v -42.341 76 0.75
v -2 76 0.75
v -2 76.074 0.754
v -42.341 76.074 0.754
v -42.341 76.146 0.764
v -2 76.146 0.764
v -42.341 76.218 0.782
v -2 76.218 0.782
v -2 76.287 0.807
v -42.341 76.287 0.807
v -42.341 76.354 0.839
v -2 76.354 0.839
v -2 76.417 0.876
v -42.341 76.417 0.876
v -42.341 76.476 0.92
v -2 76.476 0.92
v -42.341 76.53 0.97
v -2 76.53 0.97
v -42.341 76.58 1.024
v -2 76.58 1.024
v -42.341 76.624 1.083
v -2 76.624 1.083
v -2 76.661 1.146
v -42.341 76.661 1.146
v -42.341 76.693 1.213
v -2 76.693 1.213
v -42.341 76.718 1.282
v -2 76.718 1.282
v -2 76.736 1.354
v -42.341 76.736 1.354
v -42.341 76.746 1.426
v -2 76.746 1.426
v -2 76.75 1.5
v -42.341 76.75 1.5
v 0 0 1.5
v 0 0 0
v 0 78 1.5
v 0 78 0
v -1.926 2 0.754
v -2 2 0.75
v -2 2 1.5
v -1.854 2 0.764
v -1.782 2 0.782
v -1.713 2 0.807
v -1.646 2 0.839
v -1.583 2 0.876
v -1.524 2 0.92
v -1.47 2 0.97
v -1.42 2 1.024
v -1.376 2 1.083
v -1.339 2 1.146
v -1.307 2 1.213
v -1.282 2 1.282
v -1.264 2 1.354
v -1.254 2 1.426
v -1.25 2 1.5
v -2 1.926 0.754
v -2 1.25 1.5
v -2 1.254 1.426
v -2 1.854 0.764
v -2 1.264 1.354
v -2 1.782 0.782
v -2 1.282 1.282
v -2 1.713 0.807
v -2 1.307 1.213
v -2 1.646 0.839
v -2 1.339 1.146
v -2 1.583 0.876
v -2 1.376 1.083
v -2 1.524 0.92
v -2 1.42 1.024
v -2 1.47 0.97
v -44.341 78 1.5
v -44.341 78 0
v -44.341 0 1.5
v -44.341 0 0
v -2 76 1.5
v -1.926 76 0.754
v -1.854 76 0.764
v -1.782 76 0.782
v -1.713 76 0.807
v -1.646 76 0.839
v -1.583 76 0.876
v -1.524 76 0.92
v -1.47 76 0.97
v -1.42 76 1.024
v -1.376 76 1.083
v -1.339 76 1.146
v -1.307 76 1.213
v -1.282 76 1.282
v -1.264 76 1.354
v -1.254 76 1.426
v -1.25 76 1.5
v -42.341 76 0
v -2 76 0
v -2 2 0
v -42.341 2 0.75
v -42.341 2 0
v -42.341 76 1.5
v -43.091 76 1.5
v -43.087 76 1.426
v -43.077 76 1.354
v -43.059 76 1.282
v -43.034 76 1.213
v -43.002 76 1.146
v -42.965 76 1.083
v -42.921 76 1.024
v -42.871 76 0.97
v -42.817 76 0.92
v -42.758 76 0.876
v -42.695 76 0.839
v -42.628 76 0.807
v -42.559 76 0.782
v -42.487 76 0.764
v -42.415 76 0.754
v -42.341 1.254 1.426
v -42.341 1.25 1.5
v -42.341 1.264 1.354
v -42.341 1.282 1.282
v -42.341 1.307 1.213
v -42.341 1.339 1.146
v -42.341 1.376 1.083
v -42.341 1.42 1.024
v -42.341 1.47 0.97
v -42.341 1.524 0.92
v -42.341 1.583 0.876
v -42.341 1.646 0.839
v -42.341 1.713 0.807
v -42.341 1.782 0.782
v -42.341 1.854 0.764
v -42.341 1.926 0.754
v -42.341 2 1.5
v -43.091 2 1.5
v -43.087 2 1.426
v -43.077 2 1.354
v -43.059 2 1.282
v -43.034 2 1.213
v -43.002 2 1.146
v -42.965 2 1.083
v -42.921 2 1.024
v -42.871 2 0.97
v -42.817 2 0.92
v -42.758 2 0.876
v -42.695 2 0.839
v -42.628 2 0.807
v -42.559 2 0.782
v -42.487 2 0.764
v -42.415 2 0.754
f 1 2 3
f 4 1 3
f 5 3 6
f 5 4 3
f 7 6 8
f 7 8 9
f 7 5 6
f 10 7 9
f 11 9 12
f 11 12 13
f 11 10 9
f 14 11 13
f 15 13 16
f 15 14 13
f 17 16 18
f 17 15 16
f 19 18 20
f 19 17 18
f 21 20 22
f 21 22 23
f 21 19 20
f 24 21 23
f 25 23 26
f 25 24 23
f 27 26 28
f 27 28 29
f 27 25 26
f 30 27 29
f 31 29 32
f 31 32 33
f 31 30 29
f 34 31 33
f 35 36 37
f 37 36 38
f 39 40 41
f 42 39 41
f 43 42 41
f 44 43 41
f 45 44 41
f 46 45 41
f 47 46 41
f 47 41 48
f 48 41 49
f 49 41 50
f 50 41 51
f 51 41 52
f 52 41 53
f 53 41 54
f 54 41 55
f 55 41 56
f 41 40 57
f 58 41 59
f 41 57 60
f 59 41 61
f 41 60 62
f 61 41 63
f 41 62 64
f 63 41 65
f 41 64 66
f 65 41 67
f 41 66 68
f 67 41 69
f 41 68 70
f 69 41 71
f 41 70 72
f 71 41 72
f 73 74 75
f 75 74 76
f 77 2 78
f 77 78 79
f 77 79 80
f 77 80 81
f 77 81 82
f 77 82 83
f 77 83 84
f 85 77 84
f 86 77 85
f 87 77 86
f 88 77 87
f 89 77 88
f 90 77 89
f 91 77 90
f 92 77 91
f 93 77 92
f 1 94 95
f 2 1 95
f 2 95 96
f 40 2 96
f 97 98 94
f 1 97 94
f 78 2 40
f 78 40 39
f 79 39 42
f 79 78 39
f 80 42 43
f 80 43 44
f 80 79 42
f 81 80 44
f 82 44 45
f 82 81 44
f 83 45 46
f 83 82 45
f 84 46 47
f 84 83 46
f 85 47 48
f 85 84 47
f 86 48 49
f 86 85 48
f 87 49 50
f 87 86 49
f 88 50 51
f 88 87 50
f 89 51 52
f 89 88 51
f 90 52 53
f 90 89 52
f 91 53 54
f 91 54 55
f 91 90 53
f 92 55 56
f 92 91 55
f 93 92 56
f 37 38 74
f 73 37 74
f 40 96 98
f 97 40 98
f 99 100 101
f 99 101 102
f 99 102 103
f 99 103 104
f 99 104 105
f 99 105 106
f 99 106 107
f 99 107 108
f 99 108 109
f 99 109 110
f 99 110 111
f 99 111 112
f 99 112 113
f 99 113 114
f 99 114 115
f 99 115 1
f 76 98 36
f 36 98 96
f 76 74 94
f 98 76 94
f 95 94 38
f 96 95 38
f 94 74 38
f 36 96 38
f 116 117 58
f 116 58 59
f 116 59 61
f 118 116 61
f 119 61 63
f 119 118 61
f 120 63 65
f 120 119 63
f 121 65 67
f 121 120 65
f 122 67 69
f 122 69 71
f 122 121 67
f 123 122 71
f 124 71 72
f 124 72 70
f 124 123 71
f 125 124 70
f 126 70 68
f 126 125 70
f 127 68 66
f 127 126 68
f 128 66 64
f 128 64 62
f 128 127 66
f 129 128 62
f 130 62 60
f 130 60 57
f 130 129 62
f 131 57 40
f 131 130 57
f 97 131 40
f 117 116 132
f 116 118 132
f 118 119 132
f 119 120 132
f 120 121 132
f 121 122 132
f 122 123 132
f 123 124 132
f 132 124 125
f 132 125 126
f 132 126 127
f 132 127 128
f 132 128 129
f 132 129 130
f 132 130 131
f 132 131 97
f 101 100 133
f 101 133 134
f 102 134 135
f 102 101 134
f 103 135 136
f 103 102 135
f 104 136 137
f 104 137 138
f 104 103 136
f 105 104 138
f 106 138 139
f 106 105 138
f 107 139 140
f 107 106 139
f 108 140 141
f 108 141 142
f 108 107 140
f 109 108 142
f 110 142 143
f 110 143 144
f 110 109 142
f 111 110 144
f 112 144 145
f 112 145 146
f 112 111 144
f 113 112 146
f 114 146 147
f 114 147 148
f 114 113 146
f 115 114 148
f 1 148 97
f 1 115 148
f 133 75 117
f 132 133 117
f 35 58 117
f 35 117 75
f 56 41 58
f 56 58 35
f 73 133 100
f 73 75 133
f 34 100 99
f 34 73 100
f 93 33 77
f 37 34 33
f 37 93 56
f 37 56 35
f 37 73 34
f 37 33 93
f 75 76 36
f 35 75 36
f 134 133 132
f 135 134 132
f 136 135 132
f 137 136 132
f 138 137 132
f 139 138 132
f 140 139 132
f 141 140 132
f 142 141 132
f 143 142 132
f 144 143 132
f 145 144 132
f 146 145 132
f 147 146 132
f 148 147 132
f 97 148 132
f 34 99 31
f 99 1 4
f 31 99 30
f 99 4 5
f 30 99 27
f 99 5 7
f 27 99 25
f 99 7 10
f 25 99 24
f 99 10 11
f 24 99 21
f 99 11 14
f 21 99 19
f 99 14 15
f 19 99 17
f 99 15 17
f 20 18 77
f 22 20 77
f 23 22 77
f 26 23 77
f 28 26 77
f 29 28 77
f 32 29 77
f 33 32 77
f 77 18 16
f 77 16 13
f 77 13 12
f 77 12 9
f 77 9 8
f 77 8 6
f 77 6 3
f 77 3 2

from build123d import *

# Parameters (mm, degrees)
F1_DEPTH = 1.5
F4_DEPTH = 40.341
F5_DEPTH = 74


with BuildPart() as f1:
    # F0 (on Top) → F1 (new body)
    with BuildSketch(Plane.XY):
        Polygon((-44.341, 78), (-44.341, 15.8245135099), (-42.341, 15.8245135099), (-42.341, 76), (-24.9481573701, 76), (-24.9481573701, 78), align=None)
        Polygon((-44.341, 0), (0, 0), (0, 78), (-24.9481573701, 78), (-24.9481573701, 76), (-2, 76), (-2, 2), (-42.341, 2), (-42.341, 15.8245135099), (-44.341, 15.8245135099), align=None)
    extrude(amount=F1_DEPTH)

    # F2 (on face) → F4 (cut)
    with BuildSketch(Plane.YZ.offset(-42.341)):
        with BuildLine():
            ThreePointArc((76, 0.75), (76.5303300859, 0.9696699141), (76.75, 1.5))
            ThreePointArc((76.75, 1.5), (76, 2.25), (75.25, 1.5))
            Line((75.25, 1.5), (76, 1.5))
            Line((76, 1.5), (76, 0.75))
        make_face()
        with BuildLine():
            Line((76, 1.5), (75.25, 1.5))
            ThreePointArc((75.25, 1.5), (75.4696699141, 0.9696699141), (76, 0.75))
            Line((76, 0.75), (76, 1.5))
        make_face()
        with BuildLine():
            Line((2, 1.5), (2.75, 1.5))
            ThreePointArc((2.75, 1.5), (1.4696699141, 2.0303300859), (2, 0.75))
            Line((2, 0.75), (2, 1.5))
        make_face()
        with BuildLine():
            ThreePointArc((2, 0.75), (2.5303300859, 0.9696699141), (2.75, 1.5))
            Line((2.75, 1.5), (2, 1.5))
            Line((2, 1.5), (2, 0.75))
        make_face()
    extrude(amount=F4_DEPTH, mode=Mode.SUBTRACT)

    # F3 (on face) → F5 (cut)
    with BuildSketch(Plane.XZ.offset(-76)):
        with BuildLine():
            Line((-42.341, 1.5), (-41.591, 1.5))
            ThreePointArc((-41.591, 1.5), (-42.8713300859, 2.0303300859), (-42.341, 0.75))
            Line((-42.341, 0.75), (-42.341, 1.5))
        make_face()
        with BuildLine():
            ThreePointArc((-42.341, 0.75), (-41.8106699141, 0.9696699141), (-41.591, 1.5))
            Line((-41.591, 1.5), (-42.341, 1.5))
            Line((-42.341, 1.5), (-42.341, 0.75))
        make_face()
        with BuildLine():
            ThreePointArc((-1.25, 1.5), (-2, 2.25), (-2.75, 1.5))
            Line((-2.75, 1.5), (-2, 1.5))
            Line((-2, 1.5), (-2, 0.75))
            ThreePointArc((-2, 0.75), (-1.4696699141, 0.9696699141), (-1.25, 1.5))
        make_face()
        with BuildLine():
            Line((-2, 1.5), (-2.75, 1.5))
            ThreePointArc((-2.75, 1.5), (-2.5303300859, 0.9696699141), (-2, 0.75))
            Line((-2, 0.75), (-2, 1.5))
        make_face()
    extrude(amount=F5_DEPTH, mode=Mode.SUBTRACT)


solid = f1.part
